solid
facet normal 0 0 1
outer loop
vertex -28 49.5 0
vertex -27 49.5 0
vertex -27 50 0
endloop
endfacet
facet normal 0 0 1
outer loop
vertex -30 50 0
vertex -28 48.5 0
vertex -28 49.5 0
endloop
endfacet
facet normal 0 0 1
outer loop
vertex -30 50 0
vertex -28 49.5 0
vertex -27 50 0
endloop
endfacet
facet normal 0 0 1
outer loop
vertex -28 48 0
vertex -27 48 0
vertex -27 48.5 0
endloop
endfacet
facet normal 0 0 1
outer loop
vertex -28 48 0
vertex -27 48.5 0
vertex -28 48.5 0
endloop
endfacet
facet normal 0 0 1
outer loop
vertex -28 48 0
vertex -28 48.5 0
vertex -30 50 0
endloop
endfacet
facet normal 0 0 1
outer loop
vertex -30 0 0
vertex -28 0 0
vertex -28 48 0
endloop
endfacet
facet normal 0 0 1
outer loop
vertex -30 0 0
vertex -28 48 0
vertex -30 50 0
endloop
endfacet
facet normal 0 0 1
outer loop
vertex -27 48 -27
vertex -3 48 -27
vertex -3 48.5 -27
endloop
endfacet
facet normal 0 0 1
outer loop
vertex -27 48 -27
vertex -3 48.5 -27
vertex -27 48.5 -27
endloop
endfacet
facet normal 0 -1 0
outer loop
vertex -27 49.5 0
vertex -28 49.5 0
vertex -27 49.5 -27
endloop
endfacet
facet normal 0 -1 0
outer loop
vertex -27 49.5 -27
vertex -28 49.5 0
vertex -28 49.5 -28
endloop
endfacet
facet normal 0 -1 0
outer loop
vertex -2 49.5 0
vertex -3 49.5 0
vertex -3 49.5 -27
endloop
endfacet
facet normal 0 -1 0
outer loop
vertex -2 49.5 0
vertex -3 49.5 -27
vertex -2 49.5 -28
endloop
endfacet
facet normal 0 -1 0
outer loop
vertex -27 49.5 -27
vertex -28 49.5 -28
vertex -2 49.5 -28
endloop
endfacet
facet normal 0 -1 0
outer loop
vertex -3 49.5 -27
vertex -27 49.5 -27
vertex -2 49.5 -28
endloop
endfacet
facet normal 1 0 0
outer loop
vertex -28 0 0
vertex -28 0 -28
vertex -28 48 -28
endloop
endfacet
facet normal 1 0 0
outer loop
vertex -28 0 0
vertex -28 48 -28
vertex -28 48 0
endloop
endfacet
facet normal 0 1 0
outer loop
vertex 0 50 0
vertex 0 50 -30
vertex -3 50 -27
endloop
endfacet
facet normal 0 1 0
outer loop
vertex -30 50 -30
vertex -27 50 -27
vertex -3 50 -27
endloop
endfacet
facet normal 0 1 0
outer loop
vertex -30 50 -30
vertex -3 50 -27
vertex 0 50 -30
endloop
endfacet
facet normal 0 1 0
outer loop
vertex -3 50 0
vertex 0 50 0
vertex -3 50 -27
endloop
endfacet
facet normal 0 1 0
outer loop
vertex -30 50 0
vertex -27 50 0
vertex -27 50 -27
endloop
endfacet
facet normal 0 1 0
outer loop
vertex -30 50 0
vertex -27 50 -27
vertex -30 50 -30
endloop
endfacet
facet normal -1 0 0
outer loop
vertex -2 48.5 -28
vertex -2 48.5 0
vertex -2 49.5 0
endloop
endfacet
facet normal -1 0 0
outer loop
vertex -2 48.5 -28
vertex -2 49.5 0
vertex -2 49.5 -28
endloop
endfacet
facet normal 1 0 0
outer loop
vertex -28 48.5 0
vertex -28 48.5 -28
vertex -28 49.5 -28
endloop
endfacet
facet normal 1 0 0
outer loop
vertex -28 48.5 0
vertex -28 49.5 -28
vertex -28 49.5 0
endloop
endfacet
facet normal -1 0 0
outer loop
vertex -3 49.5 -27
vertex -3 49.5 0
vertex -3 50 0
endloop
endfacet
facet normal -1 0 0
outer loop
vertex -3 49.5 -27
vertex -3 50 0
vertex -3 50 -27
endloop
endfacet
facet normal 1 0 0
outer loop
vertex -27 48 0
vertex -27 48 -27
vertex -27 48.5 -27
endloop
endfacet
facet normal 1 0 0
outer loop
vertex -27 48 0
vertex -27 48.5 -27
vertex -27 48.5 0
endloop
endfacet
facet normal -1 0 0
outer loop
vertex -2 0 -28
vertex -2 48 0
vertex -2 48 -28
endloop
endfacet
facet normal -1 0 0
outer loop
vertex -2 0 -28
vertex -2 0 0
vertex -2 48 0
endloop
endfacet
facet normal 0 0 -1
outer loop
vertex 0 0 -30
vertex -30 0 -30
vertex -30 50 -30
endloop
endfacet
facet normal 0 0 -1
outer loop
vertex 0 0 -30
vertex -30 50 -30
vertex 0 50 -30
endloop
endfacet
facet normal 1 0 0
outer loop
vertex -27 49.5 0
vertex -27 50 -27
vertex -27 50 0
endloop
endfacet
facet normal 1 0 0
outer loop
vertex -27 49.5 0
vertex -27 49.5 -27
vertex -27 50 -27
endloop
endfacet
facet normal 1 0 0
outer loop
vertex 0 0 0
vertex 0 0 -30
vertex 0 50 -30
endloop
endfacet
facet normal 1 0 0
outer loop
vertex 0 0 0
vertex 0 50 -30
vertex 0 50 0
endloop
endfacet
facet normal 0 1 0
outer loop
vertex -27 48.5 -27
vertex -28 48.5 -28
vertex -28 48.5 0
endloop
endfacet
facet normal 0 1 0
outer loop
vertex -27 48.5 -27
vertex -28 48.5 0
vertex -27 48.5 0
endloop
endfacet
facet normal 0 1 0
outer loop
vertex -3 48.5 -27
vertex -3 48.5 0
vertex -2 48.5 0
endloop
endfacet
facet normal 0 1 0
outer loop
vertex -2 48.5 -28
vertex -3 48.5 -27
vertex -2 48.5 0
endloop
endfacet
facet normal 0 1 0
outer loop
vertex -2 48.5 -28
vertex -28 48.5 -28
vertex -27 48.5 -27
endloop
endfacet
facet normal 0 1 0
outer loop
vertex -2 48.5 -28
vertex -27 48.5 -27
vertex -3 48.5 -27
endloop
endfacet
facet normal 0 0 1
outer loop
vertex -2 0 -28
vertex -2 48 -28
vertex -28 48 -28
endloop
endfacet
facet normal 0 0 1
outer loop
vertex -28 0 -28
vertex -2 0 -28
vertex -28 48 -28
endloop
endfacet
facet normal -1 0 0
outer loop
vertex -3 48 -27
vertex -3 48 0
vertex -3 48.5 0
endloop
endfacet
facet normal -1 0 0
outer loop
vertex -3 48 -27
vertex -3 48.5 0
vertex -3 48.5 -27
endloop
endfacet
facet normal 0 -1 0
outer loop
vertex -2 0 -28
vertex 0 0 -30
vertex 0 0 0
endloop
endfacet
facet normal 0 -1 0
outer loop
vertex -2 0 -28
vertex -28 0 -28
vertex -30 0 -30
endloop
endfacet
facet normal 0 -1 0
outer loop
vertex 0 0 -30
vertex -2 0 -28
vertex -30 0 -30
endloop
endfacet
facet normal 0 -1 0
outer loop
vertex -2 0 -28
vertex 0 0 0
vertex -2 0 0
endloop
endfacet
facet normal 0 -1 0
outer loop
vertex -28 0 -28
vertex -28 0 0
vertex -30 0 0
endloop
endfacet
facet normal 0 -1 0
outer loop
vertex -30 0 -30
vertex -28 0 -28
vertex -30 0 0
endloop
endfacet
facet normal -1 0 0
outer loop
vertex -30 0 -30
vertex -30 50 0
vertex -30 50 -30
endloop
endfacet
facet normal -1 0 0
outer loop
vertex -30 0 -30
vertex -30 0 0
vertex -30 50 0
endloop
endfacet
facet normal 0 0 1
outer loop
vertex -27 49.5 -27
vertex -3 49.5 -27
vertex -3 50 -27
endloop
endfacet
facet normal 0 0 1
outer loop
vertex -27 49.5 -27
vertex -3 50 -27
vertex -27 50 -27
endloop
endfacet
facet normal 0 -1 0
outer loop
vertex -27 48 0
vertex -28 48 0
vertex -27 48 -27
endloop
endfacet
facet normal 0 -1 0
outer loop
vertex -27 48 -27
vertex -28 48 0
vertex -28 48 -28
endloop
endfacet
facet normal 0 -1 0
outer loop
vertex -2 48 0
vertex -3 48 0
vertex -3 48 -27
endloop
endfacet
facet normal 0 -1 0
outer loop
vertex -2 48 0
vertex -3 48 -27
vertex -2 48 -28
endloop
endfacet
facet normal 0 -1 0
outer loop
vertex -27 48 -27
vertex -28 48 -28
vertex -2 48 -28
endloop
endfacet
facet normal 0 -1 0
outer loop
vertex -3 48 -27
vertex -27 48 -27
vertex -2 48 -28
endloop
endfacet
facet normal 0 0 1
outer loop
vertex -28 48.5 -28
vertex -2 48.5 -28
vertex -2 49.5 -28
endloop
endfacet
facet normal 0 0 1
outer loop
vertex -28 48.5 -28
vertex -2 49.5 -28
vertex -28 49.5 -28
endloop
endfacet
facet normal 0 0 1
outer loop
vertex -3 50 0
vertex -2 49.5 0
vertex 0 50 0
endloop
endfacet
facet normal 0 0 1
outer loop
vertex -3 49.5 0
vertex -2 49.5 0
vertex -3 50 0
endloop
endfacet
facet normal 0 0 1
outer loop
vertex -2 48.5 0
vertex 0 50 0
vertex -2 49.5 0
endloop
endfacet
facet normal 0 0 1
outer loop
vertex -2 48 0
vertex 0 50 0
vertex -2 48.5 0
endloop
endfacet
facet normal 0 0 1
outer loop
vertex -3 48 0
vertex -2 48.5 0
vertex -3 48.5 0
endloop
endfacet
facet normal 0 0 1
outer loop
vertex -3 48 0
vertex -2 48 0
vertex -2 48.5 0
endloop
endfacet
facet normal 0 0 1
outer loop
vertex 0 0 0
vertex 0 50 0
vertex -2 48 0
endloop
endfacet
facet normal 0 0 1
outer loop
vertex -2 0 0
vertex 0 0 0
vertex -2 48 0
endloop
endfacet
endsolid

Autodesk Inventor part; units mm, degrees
ref_plane "YZ Plane" through (0, 0, 0) normal (1, 0, 0) x (0, 1, 0)
sketch "Esquisse1" plane through (0, 0, 0) normal (0, 1, 0) x (-1, 0, 0)
  line L0 (0, 0) -> (30, 0)
  line L1 (30, 0) -> (30, -30)
  line L2 (30, -30) -> (0, -30)
  line L3 (0, -30) -> (0, 0)
  line L4 (28, 0) -> (0, 0)
  line L5 (0, 0) -> (0, -198)
  line L6 (28, 0) -> (2, 0)
  line L7 (2, 0) -> (2, -28)
  line L8 (2, -28) -> (28, -28)
  line L9 (28, -28) -> (28, 0)
  dimension "d0" = 30
  dimension "d1" = 30
  dimension "d4" = 2
  dimension "d5" = 2
  dimension "d6" = 2
extrude "Extrusion1" add sketch "Esquisse1" along normal blind 50 contours L0 L7 L8 L9 L1 L2 L3
sketch "Esquisse2" plane through (0, 50, 0) normal (0, 1, 0) x (1, 0, 0)
  point P0 (0, 0)
  point P1 (-28, 0)
  point P2 (-2, 28)
ref_plane "Plan de construction1" through (0, 49.5, 0) normal (0, 1, 0) x (1, 0, 0)
ref_plane "Plan de construction2" through (0, 48, 0) normal (0, 1, 0) x (1, 0, 0)
sketch "Esquisse3" plane through (0, 49.5, 0) normal (0, 1, 0) x (1, 0, 0)
  line L0 (-28, 0) -> (-2, 0)
  line L1 (-2, 0) -> (-2, 28)
  line L2 (-2, 28) -> (-28, 28)
  line L3 (-28, 28) -> (-28, 0)
  line L4 (-27, 0) -> (-3, 0)
  line L5 (-3, 0) -> (-3, 27)
  line L6 (-3, 27) -> (-27, 27)
  line L7 (-27, 27) -> (-27, 0)
  point P0 (0, 0)
  dimension "d14" = 27
  dimension "d15" = 1
  dimension "d16" = 1
  dimension "d17" = 1
extrude "Extrusion2" add sketch "Esquisse3" along normal blind 0.5 contours L3 L2 L1 L0 L5 L6 L7
sketch "Esquisse4" plane through (0, 48, 0) normal (0, 1, 0) x (1, 0, 0)
  line L0 (-27, 0) -> (-3, 0)
  line L1 (-3, 0) -> (-3, 27)
  line L2 (-3, 27) -> (-27, 27)
  line L3 (-27, 27) -> (-27, 0)
  line L4 (-28, 0) -> (-2, 0)
  line L5 (-2, 0) -> (-2, 28)
  line L6 (-2, 28) -> (-28, 28)
  line L7 (-28, 28) -> (-28, 0)
  point P0 (0, 0)
extrude "Extrusion3" add sketch "Esquisse4" along normal blind 0.5 contours L4 L7 L6 L5 L1 L2 L3
properties part number "Pièce carré"
